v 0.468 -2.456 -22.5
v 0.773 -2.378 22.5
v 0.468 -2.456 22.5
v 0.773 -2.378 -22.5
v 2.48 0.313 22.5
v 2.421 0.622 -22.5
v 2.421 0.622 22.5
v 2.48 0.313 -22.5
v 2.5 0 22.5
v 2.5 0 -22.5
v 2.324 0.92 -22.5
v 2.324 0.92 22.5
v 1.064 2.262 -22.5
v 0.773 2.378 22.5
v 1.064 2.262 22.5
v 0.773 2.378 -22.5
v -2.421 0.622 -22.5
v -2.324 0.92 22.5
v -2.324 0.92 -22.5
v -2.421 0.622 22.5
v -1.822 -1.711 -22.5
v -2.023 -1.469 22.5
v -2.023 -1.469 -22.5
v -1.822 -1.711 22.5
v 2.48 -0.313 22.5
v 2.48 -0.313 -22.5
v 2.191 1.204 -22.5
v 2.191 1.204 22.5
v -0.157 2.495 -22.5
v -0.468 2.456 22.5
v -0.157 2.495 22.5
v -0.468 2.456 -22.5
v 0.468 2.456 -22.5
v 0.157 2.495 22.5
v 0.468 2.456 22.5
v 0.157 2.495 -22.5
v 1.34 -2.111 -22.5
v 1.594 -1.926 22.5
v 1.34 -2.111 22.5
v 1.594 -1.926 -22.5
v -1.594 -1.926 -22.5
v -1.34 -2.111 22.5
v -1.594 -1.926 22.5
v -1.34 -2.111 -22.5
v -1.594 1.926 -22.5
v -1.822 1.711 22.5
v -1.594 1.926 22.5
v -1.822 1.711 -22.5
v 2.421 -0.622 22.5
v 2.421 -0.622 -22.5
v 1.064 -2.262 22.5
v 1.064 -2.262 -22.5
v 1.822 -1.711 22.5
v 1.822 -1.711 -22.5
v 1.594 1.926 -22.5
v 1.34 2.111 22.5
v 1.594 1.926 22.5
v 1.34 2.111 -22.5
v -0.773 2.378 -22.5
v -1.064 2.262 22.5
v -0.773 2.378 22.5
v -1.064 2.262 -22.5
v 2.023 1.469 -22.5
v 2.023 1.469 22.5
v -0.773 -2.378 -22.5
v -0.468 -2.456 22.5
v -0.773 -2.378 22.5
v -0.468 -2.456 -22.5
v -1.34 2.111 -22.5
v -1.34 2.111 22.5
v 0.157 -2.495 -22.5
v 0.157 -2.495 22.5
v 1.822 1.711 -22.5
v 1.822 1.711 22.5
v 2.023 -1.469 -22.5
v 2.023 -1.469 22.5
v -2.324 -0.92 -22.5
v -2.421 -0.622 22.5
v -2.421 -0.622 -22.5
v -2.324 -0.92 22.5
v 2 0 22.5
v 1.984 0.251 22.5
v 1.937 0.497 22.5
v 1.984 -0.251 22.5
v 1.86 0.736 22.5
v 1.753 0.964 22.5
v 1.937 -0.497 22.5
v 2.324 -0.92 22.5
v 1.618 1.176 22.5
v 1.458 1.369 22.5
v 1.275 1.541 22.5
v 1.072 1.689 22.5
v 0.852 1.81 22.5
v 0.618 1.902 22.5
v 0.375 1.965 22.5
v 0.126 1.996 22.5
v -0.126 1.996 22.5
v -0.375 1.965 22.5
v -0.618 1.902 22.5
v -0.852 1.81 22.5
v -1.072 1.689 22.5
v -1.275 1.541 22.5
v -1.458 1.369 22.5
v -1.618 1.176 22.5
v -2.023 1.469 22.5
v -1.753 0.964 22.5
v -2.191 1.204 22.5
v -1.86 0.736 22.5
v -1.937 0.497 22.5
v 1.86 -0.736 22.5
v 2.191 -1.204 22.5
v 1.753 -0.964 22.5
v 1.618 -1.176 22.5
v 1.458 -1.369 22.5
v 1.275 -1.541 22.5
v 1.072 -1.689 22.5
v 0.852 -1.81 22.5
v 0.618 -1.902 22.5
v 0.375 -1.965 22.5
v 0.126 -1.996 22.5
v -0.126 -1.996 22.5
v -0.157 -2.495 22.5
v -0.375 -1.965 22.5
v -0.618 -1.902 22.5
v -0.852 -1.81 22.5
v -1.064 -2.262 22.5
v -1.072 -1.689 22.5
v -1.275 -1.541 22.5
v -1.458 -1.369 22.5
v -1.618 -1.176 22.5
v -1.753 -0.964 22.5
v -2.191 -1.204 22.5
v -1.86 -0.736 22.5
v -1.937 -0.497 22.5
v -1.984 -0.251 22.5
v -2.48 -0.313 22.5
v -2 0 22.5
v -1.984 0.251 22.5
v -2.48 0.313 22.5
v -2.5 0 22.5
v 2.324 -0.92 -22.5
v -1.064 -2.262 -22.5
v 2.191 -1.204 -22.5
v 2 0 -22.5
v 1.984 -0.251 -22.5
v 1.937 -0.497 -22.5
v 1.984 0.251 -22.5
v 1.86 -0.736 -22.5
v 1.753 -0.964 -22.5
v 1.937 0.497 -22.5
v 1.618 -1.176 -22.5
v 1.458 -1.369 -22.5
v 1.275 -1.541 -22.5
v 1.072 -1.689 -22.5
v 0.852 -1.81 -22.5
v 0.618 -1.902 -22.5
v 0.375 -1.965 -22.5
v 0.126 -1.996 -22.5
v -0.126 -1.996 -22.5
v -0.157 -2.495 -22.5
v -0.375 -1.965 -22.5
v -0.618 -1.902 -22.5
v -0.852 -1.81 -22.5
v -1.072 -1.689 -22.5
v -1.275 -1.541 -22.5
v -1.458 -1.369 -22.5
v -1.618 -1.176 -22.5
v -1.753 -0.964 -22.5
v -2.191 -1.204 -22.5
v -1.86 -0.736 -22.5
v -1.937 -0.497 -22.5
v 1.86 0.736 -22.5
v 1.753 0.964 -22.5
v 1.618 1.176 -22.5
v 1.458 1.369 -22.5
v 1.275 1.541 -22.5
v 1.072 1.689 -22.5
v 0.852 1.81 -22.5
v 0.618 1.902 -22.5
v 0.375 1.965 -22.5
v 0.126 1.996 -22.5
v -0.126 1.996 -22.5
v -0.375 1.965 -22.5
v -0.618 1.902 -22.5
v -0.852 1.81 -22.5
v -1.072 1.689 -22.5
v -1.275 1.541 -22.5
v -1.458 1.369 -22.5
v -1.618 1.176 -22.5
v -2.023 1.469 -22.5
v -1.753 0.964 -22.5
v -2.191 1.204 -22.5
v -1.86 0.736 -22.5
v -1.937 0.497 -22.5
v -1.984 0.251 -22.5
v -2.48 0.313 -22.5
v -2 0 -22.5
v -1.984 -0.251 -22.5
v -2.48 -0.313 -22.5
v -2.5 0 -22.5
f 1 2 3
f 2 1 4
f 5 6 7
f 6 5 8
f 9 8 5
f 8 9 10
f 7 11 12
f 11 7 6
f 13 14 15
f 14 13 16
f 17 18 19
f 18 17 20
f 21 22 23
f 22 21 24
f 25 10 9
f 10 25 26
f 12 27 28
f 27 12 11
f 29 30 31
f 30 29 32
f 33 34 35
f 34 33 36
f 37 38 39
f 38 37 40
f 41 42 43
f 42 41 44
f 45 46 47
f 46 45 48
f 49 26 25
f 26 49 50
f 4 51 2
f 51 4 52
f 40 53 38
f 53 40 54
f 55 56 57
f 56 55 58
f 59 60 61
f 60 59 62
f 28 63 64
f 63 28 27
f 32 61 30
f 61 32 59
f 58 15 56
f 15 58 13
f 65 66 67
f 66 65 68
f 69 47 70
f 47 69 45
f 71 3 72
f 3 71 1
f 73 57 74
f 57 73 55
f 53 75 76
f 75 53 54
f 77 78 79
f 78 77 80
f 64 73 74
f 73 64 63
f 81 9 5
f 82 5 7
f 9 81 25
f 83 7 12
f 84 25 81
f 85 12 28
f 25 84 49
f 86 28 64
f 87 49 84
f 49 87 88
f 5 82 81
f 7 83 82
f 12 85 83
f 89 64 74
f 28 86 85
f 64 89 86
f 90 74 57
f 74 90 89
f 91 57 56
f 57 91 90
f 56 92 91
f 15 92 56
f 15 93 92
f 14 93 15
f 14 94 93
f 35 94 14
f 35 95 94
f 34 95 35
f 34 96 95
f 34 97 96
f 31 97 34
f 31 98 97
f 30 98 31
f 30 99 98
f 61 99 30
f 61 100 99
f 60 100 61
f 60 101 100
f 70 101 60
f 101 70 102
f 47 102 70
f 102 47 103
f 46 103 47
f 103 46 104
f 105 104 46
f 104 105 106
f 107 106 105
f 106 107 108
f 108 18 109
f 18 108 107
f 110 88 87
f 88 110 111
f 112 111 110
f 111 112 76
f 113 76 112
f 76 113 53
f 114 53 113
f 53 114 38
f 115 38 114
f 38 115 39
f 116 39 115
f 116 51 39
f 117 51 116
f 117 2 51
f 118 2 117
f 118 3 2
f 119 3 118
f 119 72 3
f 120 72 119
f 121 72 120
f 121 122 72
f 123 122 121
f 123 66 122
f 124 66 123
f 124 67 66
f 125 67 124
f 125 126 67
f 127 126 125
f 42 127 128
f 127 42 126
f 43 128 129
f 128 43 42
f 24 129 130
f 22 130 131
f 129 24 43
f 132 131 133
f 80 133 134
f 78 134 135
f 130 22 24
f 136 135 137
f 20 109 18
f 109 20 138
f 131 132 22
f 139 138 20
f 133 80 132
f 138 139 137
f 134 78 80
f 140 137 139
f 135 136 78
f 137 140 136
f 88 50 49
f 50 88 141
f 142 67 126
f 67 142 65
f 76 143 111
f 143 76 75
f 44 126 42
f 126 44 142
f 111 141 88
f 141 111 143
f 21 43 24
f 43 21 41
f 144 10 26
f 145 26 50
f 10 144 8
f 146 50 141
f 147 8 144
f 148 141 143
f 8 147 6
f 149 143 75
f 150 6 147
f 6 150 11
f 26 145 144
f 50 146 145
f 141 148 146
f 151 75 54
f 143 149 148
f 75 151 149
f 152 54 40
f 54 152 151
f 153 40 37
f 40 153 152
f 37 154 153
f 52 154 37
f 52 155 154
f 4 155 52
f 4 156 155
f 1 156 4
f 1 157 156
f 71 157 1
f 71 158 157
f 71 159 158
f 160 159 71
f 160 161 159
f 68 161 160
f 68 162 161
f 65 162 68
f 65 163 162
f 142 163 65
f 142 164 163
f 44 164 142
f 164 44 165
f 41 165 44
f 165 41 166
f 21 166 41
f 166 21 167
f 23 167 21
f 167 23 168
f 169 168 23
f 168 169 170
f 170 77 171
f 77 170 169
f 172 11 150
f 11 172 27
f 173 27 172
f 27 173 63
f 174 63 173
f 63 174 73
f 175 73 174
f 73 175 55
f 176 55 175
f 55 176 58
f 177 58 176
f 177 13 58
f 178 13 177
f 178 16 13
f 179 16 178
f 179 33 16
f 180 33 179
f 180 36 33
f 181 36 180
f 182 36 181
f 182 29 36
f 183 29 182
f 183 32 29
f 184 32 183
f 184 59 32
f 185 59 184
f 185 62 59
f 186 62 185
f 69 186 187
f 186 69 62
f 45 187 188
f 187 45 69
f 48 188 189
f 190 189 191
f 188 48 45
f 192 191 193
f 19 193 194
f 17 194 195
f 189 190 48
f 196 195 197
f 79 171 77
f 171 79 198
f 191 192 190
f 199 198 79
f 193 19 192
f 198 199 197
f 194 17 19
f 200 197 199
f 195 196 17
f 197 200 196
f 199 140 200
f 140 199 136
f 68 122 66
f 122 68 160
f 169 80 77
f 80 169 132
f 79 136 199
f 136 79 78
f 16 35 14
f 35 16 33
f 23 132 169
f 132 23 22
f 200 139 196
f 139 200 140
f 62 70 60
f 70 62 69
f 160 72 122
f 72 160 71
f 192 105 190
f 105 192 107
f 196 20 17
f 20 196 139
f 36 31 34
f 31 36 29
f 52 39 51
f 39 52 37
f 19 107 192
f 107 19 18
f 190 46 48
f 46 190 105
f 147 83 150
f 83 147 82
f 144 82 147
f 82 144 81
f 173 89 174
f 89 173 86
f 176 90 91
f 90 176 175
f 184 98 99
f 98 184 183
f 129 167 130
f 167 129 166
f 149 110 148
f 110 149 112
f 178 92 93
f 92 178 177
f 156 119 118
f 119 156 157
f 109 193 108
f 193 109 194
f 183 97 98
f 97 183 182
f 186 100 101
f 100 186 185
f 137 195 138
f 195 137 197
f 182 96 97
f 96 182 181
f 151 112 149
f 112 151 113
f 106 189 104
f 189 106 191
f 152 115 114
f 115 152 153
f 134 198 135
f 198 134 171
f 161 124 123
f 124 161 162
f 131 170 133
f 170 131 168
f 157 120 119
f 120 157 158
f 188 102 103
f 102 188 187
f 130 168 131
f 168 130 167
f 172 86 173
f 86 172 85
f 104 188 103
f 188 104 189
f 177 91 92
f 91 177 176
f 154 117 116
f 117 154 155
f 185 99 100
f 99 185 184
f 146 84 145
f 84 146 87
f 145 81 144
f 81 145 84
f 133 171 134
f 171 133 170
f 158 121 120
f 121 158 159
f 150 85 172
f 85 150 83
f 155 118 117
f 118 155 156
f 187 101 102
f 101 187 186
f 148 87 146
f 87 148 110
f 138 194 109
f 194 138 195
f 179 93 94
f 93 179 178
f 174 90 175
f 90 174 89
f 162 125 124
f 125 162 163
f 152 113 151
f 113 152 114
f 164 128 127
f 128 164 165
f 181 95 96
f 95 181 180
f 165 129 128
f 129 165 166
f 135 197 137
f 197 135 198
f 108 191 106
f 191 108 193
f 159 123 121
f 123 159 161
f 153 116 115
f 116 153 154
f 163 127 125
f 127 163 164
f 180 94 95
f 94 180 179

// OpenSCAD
$fn = 50;


difference() {
	union() {
		translate(v = [0, 0, -22.5000000000]) {
			cylinder(h = 45, r = 2.5000000000);
		}
	}
	union() {
		translate(v = [0, 0, -100.0000000000]) {
			cylinder(h = 200, r = 2.0000000000);
		}
	}
}
